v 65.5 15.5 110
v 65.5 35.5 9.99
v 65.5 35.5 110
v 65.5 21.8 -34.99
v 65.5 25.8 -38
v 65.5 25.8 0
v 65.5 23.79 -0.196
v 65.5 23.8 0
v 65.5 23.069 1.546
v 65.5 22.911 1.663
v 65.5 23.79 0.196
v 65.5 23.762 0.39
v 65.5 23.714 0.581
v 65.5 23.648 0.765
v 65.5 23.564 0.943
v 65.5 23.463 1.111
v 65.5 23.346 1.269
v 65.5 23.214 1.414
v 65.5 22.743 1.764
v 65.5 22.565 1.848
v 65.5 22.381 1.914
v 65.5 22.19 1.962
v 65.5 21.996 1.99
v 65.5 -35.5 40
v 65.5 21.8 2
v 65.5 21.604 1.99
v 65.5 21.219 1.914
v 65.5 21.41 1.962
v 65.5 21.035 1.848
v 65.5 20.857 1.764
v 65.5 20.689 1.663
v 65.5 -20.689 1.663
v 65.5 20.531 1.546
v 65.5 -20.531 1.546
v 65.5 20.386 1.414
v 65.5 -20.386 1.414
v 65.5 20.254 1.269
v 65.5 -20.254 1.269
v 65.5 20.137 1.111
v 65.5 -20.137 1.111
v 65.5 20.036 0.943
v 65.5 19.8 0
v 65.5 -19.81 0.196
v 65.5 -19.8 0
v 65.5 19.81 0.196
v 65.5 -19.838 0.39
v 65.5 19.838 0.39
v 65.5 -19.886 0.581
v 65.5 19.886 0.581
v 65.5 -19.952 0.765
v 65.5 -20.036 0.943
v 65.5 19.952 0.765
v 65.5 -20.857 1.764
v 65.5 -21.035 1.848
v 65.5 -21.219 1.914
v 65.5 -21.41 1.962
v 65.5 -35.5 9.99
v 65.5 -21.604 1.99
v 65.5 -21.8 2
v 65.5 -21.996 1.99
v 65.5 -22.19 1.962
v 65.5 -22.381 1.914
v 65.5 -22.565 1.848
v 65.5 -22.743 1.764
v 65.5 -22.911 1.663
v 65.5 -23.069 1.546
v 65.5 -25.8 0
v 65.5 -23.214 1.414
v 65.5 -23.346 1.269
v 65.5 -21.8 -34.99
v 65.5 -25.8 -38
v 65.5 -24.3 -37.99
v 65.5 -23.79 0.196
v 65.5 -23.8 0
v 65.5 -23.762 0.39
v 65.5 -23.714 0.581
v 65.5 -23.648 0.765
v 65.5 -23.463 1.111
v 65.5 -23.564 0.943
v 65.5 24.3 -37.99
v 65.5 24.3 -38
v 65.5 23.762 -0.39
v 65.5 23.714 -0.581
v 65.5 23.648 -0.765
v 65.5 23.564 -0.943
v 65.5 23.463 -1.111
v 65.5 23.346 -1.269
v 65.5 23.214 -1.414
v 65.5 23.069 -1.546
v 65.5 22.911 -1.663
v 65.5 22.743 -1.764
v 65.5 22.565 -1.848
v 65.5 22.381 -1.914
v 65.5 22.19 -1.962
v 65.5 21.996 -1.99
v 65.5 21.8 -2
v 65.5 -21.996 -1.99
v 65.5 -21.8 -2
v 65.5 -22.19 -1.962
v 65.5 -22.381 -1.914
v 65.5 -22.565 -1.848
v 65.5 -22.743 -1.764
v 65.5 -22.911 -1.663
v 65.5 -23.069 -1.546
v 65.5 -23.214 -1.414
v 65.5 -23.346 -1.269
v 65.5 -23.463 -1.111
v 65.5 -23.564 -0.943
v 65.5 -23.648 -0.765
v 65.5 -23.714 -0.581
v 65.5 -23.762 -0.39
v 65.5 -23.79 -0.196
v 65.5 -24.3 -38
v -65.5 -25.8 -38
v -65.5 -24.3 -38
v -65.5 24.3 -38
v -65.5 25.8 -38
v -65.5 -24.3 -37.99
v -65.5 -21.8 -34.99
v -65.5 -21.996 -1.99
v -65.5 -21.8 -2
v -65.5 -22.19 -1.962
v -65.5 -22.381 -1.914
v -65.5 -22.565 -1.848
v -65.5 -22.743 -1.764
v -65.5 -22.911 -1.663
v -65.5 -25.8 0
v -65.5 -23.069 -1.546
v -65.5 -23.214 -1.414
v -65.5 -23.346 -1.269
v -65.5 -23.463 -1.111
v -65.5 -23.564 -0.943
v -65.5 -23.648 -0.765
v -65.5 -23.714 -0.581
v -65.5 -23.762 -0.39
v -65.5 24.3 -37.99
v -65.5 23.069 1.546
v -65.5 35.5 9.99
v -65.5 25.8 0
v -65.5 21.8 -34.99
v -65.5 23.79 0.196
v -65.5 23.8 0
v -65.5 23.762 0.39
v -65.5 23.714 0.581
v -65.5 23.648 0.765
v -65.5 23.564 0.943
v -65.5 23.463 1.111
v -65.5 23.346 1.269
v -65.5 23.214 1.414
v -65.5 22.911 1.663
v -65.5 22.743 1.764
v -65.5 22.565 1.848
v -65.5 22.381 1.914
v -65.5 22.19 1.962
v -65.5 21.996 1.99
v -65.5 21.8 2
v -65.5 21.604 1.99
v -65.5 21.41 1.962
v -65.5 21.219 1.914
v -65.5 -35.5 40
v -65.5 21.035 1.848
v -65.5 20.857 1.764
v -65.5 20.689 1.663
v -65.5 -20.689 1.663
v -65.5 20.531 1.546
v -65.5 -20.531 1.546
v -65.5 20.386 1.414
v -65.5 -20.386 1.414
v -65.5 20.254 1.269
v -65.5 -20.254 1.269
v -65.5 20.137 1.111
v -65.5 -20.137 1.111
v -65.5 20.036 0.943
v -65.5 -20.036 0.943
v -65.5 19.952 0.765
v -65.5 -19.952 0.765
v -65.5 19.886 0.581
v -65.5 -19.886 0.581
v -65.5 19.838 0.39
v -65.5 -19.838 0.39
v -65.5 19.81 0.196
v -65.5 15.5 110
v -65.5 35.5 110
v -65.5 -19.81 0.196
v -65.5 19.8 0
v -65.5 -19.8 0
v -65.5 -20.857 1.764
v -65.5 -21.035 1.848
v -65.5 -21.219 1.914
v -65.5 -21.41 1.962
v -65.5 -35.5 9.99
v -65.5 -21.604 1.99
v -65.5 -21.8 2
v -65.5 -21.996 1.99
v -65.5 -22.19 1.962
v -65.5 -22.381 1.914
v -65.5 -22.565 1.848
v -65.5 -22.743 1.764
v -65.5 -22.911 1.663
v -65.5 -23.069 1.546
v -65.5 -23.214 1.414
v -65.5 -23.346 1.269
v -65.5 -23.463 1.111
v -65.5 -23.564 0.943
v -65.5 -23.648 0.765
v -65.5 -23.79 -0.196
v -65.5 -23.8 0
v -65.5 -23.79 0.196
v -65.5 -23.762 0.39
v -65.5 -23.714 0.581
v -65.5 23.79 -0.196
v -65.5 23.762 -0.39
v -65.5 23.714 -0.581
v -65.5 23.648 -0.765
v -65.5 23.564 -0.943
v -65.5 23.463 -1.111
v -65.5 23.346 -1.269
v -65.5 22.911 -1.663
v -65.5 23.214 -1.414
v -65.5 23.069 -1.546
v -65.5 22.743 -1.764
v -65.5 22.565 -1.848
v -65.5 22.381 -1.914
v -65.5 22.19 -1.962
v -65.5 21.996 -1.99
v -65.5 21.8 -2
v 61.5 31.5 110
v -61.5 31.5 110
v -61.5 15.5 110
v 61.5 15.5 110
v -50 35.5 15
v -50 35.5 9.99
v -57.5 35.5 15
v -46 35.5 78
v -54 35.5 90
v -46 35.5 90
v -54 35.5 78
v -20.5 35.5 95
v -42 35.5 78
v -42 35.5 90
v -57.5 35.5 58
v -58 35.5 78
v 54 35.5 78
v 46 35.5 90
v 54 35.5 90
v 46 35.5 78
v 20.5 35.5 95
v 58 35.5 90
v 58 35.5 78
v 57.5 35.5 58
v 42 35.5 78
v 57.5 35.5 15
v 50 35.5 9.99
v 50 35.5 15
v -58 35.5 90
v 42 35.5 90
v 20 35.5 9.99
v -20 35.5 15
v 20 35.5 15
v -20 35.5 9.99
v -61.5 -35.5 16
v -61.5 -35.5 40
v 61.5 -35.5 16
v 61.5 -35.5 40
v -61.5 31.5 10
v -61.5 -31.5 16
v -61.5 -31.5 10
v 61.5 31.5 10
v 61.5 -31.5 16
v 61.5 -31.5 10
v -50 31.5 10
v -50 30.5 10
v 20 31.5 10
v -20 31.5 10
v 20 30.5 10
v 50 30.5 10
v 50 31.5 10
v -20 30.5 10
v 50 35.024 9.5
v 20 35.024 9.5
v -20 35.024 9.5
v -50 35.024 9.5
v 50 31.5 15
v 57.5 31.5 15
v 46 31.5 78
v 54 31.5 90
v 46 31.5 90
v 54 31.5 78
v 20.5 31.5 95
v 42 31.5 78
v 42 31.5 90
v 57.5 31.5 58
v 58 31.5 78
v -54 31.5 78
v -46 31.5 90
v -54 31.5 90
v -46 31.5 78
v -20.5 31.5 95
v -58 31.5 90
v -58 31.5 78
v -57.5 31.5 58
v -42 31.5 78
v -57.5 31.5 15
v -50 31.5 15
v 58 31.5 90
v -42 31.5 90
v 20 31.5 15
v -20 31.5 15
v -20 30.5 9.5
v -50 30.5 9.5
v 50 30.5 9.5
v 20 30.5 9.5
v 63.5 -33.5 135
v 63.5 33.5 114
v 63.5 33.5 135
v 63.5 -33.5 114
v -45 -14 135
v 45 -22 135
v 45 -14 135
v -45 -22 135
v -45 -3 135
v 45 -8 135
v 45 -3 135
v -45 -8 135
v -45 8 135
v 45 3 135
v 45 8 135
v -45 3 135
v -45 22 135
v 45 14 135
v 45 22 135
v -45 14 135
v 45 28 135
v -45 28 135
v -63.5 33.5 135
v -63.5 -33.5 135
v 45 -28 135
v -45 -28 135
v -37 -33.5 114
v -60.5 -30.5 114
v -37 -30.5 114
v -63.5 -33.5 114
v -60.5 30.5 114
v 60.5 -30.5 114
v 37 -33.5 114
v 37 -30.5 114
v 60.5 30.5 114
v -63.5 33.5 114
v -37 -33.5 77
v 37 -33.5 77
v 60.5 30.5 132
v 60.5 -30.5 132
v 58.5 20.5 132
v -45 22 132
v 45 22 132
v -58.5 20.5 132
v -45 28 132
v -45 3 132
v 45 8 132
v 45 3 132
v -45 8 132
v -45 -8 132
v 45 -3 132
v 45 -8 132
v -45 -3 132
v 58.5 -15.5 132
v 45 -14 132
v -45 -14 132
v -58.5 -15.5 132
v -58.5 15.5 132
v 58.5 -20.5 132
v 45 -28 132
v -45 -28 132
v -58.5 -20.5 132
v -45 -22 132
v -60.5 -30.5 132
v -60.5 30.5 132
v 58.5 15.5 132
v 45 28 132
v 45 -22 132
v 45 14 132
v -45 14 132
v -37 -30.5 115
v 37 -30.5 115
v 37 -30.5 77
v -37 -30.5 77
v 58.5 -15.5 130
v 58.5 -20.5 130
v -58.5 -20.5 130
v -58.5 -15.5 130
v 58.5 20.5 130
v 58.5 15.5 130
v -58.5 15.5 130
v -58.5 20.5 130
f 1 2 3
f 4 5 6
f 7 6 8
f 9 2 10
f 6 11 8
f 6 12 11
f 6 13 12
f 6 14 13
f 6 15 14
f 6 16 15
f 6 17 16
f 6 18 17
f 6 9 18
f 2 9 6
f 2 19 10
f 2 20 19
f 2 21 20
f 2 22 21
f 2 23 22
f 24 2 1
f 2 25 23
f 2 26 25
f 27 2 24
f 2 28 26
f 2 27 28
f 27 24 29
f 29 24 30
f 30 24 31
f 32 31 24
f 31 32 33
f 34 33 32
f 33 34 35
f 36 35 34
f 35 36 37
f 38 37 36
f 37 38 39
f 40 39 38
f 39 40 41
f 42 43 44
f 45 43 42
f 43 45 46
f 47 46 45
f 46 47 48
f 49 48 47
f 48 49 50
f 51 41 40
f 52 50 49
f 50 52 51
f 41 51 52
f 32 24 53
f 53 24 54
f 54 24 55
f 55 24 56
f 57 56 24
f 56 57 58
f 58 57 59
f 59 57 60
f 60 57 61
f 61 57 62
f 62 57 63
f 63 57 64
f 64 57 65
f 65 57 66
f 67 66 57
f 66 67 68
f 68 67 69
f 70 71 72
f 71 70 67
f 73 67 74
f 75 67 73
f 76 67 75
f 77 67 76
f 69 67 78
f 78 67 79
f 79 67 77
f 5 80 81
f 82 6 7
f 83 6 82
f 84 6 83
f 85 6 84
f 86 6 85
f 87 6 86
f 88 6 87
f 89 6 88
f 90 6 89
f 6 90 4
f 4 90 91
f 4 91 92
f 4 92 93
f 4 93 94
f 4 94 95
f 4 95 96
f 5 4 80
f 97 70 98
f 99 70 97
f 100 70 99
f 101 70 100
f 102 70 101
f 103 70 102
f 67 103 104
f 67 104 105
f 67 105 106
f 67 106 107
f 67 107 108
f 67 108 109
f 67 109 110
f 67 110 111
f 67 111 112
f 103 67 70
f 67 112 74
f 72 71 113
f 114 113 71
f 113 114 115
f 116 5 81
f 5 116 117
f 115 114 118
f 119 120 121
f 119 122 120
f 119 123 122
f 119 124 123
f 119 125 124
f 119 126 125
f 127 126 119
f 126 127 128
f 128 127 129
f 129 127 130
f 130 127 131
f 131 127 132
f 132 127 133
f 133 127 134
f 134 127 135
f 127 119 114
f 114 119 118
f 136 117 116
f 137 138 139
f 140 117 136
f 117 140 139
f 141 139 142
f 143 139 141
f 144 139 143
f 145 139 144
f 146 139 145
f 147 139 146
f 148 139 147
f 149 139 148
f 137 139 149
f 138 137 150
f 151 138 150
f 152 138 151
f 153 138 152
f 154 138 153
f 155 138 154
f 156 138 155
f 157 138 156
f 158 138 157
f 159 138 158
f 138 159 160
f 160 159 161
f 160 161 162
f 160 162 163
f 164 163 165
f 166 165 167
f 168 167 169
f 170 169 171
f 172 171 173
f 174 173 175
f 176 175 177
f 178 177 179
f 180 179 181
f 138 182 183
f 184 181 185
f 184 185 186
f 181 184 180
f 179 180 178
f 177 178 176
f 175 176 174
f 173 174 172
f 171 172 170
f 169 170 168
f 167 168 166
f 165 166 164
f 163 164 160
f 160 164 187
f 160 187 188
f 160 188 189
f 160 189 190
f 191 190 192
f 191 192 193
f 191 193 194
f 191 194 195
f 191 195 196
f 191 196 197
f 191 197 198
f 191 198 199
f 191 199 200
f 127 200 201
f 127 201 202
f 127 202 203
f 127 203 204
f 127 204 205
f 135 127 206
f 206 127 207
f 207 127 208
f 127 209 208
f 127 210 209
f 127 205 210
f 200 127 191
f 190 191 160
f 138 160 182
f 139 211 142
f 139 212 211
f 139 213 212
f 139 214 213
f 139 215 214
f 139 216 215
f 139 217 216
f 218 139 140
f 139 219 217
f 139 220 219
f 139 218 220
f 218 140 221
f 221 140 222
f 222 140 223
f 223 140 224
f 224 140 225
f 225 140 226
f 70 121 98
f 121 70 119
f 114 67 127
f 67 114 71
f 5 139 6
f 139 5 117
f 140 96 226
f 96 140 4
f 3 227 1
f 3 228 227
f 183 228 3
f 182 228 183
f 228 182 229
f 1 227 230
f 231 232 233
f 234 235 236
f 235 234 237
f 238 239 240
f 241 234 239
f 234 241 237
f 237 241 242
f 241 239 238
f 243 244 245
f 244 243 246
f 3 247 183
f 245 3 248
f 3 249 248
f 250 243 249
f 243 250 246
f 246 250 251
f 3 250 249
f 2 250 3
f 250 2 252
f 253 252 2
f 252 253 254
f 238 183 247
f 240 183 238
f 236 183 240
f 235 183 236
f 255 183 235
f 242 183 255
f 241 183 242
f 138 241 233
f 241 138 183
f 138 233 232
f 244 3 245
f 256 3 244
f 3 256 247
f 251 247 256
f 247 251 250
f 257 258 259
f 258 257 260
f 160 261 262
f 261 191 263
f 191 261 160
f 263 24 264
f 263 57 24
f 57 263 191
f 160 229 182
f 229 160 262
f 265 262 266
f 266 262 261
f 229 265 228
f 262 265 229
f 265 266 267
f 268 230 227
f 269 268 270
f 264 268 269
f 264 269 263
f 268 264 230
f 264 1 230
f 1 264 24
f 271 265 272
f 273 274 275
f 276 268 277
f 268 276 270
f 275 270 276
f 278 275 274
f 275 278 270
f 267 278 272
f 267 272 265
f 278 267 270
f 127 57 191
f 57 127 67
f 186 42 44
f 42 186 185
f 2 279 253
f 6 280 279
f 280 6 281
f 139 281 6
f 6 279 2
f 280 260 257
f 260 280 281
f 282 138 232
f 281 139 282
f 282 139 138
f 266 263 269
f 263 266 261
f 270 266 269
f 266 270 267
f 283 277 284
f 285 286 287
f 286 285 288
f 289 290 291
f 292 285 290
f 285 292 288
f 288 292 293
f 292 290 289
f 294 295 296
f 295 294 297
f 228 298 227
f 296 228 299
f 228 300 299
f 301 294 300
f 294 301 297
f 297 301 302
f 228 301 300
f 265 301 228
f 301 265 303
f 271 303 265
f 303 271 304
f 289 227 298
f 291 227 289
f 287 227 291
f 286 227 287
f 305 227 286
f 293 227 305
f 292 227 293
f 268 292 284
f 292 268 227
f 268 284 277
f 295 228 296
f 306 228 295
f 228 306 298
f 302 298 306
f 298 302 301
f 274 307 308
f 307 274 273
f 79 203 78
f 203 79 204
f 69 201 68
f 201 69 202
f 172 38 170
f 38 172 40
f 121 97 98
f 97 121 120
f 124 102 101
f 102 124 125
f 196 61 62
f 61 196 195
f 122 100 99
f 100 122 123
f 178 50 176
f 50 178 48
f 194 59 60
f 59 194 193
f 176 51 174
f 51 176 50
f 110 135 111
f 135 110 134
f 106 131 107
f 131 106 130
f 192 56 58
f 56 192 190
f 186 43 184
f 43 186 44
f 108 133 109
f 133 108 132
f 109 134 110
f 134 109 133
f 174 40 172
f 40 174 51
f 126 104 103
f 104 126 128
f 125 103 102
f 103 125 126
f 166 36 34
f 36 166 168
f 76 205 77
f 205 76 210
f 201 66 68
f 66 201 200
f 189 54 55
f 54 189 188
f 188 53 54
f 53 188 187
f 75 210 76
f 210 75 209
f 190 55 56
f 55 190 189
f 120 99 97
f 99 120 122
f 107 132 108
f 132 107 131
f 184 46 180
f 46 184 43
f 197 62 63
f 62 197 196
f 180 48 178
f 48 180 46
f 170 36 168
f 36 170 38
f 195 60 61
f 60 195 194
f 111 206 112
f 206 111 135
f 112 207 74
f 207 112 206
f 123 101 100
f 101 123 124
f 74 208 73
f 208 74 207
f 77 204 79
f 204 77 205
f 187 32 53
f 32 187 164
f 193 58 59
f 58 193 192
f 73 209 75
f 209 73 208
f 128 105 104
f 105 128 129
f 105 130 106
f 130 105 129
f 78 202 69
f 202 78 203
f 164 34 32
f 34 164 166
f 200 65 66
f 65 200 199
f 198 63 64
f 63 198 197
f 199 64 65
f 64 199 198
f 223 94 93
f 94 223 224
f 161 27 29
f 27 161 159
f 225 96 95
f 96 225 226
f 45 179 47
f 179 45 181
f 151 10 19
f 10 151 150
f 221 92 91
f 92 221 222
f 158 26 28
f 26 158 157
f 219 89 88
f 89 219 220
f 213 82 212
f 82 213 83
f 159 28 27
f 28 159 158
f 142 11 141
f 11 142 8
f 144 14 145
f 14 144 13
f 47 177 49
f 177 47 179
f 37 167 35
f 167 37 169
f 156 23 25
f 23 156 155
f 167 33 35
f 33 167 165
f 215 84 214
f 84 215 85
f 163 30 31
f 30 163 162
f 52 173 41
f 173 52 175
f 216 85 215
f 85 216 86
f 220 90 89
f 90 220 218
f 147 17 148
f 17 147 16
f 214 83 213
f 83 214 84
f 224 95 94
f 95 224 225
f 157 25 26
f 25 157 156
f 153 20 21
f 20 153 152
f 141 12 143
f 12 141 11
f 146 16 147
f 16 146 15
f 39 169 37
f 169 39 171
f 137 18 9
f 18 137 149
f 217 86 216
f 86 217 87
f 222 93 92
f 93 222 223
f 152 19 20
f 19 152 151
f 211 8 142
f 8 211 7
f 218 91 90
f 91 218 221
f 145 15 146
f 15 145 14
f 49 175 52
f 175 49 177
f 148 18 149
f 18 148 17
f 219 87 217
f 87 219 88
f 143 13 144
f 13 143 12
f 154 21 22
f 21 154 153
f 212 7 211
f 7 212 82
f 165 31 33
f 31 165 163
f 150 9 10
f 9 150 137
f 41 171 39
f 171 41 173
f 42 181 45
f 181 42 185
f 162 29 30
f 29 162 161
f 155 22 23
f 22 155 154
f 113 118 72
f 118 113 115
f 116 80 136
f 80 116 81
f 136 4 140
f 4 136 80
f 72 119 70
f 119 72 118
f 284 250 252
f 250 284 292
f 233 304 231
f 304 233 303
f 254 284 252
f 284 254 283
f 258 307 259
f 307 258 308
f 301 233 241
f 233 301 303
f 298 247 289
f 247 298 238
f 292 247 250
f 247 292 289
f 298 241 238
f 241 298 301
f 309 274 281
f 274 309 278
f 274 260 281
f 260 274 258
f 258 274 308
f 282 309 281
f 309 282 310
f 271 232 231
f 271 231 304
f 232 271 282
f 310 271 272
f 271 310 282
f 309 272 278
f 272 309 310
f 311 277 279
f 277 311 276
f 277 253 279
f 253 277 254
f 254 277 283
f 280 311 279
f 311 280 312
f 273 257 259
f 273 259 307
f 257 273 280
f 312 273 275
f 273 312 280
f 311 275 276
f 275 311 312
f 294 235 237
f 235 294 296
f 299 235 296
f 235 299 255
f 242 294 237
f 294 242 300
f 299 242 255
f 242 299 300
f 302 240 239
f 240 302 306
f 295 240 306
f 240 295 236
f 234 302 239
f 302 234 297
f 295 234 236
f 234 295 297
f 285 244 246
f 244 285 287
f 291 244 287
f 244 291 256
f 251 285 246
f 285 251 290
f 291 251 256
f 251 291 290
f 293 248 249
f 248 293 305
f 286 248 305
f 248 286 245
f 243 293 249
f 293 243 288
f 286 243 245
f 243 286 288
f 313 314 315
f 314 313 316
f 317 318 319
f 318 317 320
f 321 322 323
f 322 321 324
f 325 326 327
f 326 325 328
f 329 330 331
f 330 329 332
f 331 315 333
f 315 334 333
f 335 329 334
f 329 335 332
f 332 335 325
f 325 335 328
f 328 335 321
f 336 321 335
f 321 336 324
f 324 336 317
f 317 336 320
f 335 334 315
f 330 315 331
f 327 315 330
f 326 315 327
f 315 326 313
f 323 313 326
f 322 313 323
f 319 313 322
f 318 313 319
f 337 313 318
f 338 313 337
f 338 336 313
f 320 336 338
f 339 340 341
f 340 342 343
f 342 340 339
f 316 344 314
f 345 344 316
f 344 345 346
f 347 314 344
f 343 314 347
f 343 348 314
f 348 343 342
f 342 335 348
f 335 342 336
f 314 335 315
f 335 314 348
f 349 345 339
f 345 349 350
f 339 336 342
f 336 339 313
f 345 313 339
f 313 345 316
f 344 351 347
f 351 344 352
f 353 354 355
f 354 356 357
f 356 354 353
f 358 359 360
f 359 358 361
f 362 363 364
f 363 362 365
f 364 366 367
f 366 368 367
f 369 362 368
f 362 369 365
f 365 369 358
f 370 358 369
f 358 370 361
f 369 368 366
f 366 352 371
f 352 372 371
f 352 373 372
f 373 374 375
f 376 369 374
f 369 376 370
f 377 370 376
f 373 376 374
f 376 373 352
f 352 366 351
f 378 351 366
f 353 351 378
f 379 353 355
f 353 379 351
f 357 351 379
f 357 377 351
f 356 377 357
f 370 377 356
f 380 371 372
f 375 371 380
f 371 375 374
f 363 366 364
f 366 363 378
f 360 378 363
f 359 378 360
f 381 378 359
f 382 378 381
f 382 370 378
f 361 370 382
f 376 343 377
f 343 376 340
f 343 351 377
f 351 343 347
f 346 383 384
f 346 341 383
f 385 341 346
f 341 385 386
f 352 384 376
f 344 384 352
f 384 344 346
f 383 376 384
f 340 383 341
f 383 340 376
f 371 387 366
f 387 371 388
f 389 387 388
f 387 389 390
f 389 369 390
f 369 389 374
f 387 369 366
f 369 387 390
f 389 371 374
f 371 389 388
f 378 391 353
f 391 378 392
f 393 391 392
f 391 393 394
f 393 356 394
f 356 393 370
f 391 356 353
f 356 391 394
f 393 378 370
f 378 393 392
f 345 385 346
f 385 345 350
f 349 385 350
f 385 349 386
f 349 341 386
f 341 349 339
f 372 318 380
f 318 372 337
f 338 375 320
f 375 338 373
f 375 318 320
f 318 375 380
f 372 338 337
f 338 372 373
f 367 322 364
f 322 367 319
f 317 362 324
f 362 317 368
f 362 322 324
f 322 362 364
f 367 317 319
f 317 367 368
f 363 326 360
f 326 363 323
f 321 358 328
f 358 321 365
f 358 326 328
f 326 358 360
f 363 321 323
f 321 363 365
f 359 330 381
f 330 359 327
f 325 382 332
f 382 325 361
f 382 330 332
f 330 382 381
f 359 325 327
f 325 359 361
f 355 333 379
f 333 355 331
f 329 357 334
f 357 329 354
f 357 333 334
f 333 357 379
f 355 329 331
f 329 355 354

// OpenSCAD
// file: sac5a_display_hood.scad
// =============================================================================
//  定刻起床装置 個人簡易型 SAC-5A型  制御タイマー(型式 SUK-49) 用
//  液晶めかくしフード（上からかぶせる蓋）
// -----------------------------------------------------------------------------
//  ・本体の上端に上からスポッとかぶせるキャップ
//  ・前に垂れる「バイザー」が液晶だけを覆う
//  ・アラームボタンも停止A/Bも操作ボタンも、全部バイザーの外に出る
//  ・外すときは真上に持ち上げるだけ
//
//  寸法根拠 : 取扱説明書「制御タイマー 各部名称」図を 800 dpi で描画して実測
//             （120 × 120 の盤面に対し、左端／底面からの mm）
//
//    液晶ディスプレイ  … 左 25.8〜94.4 / 底 69.3〜104.2
//    LED表示(電源/アラーム/停電/エラー) … 左 28.4〜63.7 / 底 56.4〜64.6
//    アラームボタン    … 左 73.1〜93.6 / 底 39.8〜49.2
//    停止ボタンA       … 左  2.6〜19.7 / 底 79〜94
//    停止ボタンB       … 左 99.5〜116.1 / 底 79〜94
//
//  → 液晶は盤面のほぼ中央(中心から ±34.4)、停止ボタンはその外側(±40.3 より外)。
//    バイザーを半幅 37 にすると、液晶を完全に覆ったまま停止A/Bが両方露出する。
//  → バイザー下端を底から 67 にすると、液晶(69.3)は覆い、
//    LED表示(64.6)とアラームボタン(49.2)は見える/押せる。
//
//  座標系 : z = 0 が制御タイマーの上面 / x,y は本体の中心
//           -Y = 表示・ボタン側 / +Y = 背面側
//  単位   : mm
// =============================================================================

$fn = 48;

// --------------------------------------------------- 制御タイマー(SUK-49)
DEV_W = 120;   // 幅   (X)
DEV_D = 60;    // 奥行 (Y)
DEV_H = 120;   // 高さ (Z)

// ------------------------------------------------------------------ はめあい
FIT   = 0.5;   // 片側クリアランス。きつくて入らない→0.7 / ゆるい→0.35

// -------------------------------------------------------------------- 肉厚等
WALL    = 3;   // 側面・背面・バイザーの厚さ
TOP_T   = 3;   // 天板厚
SKIRT_H = 16;  // 本体上端から下へ何mmかぶせるか（この範囲は全周を囲む）

// ------------------------------------------------------------------ バイザー
VISOR_HW     = 37;  // 半幅。液晶(±34.4)を覆い、停止A/B(±40.3〜)を避ける
VISOR_BOTTOM = 67;  // 下端（本体底面からの高さ）
                    //   67 … 液晶だけ覆う。LED表示とアラームボタンは見える(既定)
                    //   53 … LED表示も覆う。アラームボタンはまだ押せる

// -------------------------------------------------------------------- 通気
VENT    = true; // 天板のスリット（通気 + 指がかり）
RIB_H   = 2;    // 天板を本体上面から浮かせるリブの高さ

PLACE_ON_BED = true; // true: 天板を下にして Z=0 に配置（造形向き）

// =============================================================================
//  派生寸法（z = 0 が本体の上面）
// =============================================================================
iw = DEV_W / 2 + FIT;   // 内側 半幅
ow = iw + WALL;         // 外側 半幅
id = DEV_D / 2 + FIT;   // 内側 半奥行
od = id + WALL;         // 外側 半奥行

plate_z0 = RIB_H;            // 天板 下面
plate_z1 = RIB_H + TOP_T;    // 天板 上面
visor_z  = VISOR_BOTTOM - DEV_H;  // バイザー下端（本体上面基準なので負）

module bx(x0, x1, y0, y1, z0, z1)
    translate([min(x0, x1), min(y0, y1), min(z0, z1)])
        cube([abs(x1 - x0), abs(y1 - y0), abs(z1 - z0)]);

// =============================================================================
//  1. キャップ : 本体の上端 SKIRT_H mm を全周囲む箱（下面は開放）
// =============================================================================
module cap() {
    difference() {
        bx(-ow, ow, -od, od, -SKIRT_H, plate_z1);
        bx(-iw, iw, -id, id, -SKIRT_H - 1, plate_z0);
    }
}

// 天板を浮かせるリブ（本体上面に当たる）
module ribs() {
    for (sy = [-1, 1])
        bx(-iw + 2, iw - 2, sy * 18 - 2.5, sy * 18 + 2.5, 0, plate_z0 + 0.5);
}

// =============================================================================
//  2. バイザー : 前面から下へ垂れて液晶だけを覆う
// =============================================================================
module visor() {
    bx(-VISOR_HW, VISOR_HW, -od, -id, visor_z, -SKIRT_H + 1);
}

// =============================================================================
//  3. 天板のスリット（通気と指がかり）
// =============================================================================
module vents() {
    if (VENT)
        for (yc = [-25, -11, 0, 11, 25])   // リブ(±18)に掛からない位置
            bx(-45, 45, yc - 3, yc + 3, plate_z0 - 1, plate_z1 + 1);
}

// =============================================================================
//  組み立て
// =============================================================================
module hood() {
    difference() {
        union() {
            cap();
            ribs();
            visor();
        }
        vents();
    }
}

// 参考表示 : 制御タイマー本体（STL には含まれない）
module device_ghost() {
    %translate([-DEV_W / 2, -DEV_D / 2, -DEV_H])
        cube([DEV_W, DEV_D, DEV_H]);
}

if (PLACE_ON_BED)
    translate([0, 0, plate_z1]) rotate([180, 0, 0]) hood();
else
    hood();
// file: sac5a_controller_mount.scad
// =============================================================================
//  定刻起床装置 個人簡易型 SAC-5A型  制御タイマー(型式 SUK-49) 用
//  ベッドフレーム(43 x 43 角パイプ)上置きホルダー
// -----------------------------------------------------------------------------
//  構造
//    ・角パイプに上からかぶせる ∩ 形の脚（ねじ・金具なし）
//    ・その真上のベースプレートにポケットを載せる
//    ・制御タイマーは上から落とし込んで差し込む
//
//  「フレームより上」に置く利点
//    ・本体背面が完全に空中に出るので、送風機プラグ・電源ケーブル・電池カバーの
//      逃がしを考えなくてよい（角パイプが後ろに来ない）
//    ・荷重が角パイプの真上に載るので片持ちにならず、曲げがほぼ発生しない
//
//  寸法根拠 (新光電業(株) SAC-5A型 取扱説明書「主な製品仕様」)
//    制御タイマー(SUK-49)  高さ 120 × 幅 120 × 奥行 60 (mm) / 500 (g)
//
//  ---------------------------------------------------------------------------
//  取扱説明書の「各部名称」図を実測して得た、盤面上の要素配置
//  （120 × 120 の盤面に対し、左端／底面からの mm。図面からの読み取り値）
//
//    ≪背面≫  送風機プラグ差込口 … 左 14〜35  / 底 24〜40
//             電源ケーブル差込口 … 左 14〜35  / 底 14〜22
//             電池カバー         … 左 47〜113 / 底  9〜42
//             ツマミ             … 左 約 80   / 底 42〜48
//      → 底から約 48 mm より上は完全な平面。背面パネルはここから上に張る。
//      → 差込口が左右どちら側に来るかは設置の向き次第なので、開口は左右対称。
//
//    ≪正面≫  最下段の[戻る]ボタン下端 … 底から 8 mm
//      → 表示側リップは 6 mm までに抑える。
//  ---------------------------------------------------------------------------
//
//  向き
//    -Y 側 … 表示・操作ボタン面（寝ている人の側を向く）→ リップを低く
//    +Y 側 … 背面（送風機プラグ / 電源ケーブル / 電池カバー）→ ケーブルは外へ抜ける
//    逆向きにしたいときは FLIP_Y = true
//
//  座標系 : Z=0 レール上面 / Y=0 レール断面中心 / X = レール長手方向
//  単位   : mm
// =============================================================================

$fn = 64;

// --------------------------------------------------- 制御タイマー(SUK-49)
DEV_W   = 120;   // 幅   (X)
DEV_H   = 120;   // 高さ (Z) ※参考値。ポケットは全高を覆わない
DEV_D   = 60;    // 奥行 (Y)
DEV_CLR = 1.5;   // 片側クリアランス(角R・印刷誤差ぶん)

// ------------------------------------------------------- ベッドフレーム
RAIL_W   = 43;   // 角パイプ 幅   (Y)
RAIL_H   = 43;   // 角パイプ 高さ (Z) ※掛かりは LEG_DROP で決まる
RAIL_CLR = 0.6;  // はめあいクリアランス(全幅)。きつい→0.8 / ゆるい→0.4

// --------------------------------------------------------------- 肉厚等
WALL     = 4;    // 一般肉厚(側壁・リップ・脚)
PLATE_T  = 10;   // ベースプレート厚(サドル天板 兼 ポケット床)
LEG_DROP = 38;   // 脚の掛かり深さ(RAIL_H=43 に対して)

// ------------------------------------------------------------- ポケット
POCKET_Y     = 0;   // レール中心からのYオフセット(+で外側へずらす)
SIDE_H_CABLE = 100; // 側壁高さ : ケーブル側(+Y)。背面パネルと同じ高さ
SIDE_H_FACE  = 30;  // 側壁高さ : 表示側(-Y)
LIP_FACE_H   = 6;   // 表示側リップ。[戻る]ボタン下端(底から8mm)より低くする

// ------------------------------------------------------------- 背面パネル
//   左右の側壁を上端で繋いで箱剛性を出し、本体の背面を受け止める。
//   下側は大きく開けて、差込口・電池カバー・ケーブルの通り道にする。
BACK_LIP_H    = 5;    // 開口の下端 = 底のリップ高さ。電池カバー下端(9mm)より低く
BACK_OPEN_HW  = 57.5; // 開口の半幅。電池カバー端(中心から53mm)を逃がす
BACK_OPEN_TOP = 48;   // 開口の垂直部の上端。ツマミ上端(48mm)まで開ける
BACK_CHAMF    = 37;   // ここから45度で絞る高さ。天井は 115-2*37 = 41mm のブリッジ
TIE_SLOTS     = true; // 結束バンド用スリット(ケーブルを背面パネルに留める)

// ----------------------------------------------------------- クランプねじ
//   既定では「かぶせるだけ」のシンプルな形。停止ボタンを押したときのガタつきが
//   気になる場合だけ CLAMP_SCREWS = true にすると、脚にねじボスが生える。
CLAMP_SCREWS = false; // M4x25 を2本、表示側の脚から締めてガタ止め
SCREW_D      = 3.4;   // M4 タッピング下穴
BOSS_D       = 11;    // ねじボス外径
BOSS_L       = 6;     // ねじボス突出量(45度テーパでサポートレス)
SCREW_X      = 30;    // ねじ位置(中心からの距離)
SCREW_Z      = -20;   // ねじ高さ

// ------------------------------------------------------------- オプション
CABLE_NOTCH  = true;  // 底のリップの切り欠き(ケーブルをプレート面へ落とす)
FLIP_Y       = false; // true で表示面の向きを反転
PLACE_ON_BED = true;  // true: 底面が Z=0 に来るよう移動(スライサ用)

// =============================================================================
//  派生寸法
// =============================================================================
cav_w     = RAIL_W + RAIL_CLR;   // レールが通る空間の幅
cav_y     = cav_w / 2;           // その内壁 Y
out_y     = cav_y + WALL;        // 脚の外面 Y

pocket_w  = DEV_W + 2 * DEV_CLR;
pocket_d  = DEV_D + 2 * DEV_CLR;
px        = pocket_w / 2;        // ポケット内壁 X
cx        = px + WALL;           // 外壁 X

dy0       = POCKET_Y - pocket_d / 2;  // 表示側(-Y) 内壁
dy1       = POCKET_Y + pocket_d / 2;  // ケーブル側(+Y) 内壁
py0       = dy0 - WALL;               // 表示側 外面
py1       = dy1 + WALL;               // ケーブル側 外面

plate_top = PLATE_T;             // 本体が載る面(レール上面から +10 mm)

// 対角2点から直方体をつくる汎用モジュール
module bx(x0, x1, y0, y1, z0, z1)
    translate([min(x0, x1), min(y0, y1), min(z0, z1)])
        cube([abs(x1 - x0), abs(y1 - y0), abs(z1 - z0)]);

// =============================================================================
//  1. 脚 : 角パイプに上からかぶせる ∩ 形
// =============================================================================
module legs() {
    for (sy = [-1, 1])
        bx(-cx, cx, sy * cav_y, sy * out_y, -LEG_DROP, 1);
    if (CLAMP_SCREWS)
        for (sx = [-1, 1])
            translate([sx * SCREW_X, -out_y, SCREW_Z])
                rotate([90, 0, 0])
                    cylinder(d1 = BOSS_D + 2 * BOSS_L, d2 = BOSS_D, h = BOSS_L);
}

// レールが入る空間(下方向に開口)+ 差し込みリード面取り + 天面内隅の逃がし
module rail_cavity() {
    len = 2 * cx + 20;
    bx(-len / 2, len / 2, -cav_y, cav_y, -(LEG_DROP + 40), 0);
    // 脚の下端 3 mm を広げて、かぶせやすくする(内側へ約40度で立ち上がるので自立)
    hull() {
        bx(-len / 2, len / 2, -cav_y, cav_y, -LEG_DROP + 3, -LEG_DROP + 3.01);
        bx(-len / 2, len / 2, -(cav_y + 2.5), cav_y + 2.5, -LEG_DROP, -LEG_DROP + 0.01);
    }
    // 天面内隅の逃がし(積層のダレとパイプ角Rを吸収)
    for (sy = [-1, 1])
        translate([-len / 2, sy * cav_y, 0])
            rotate([0, 90, 0])
                cylinder(d = 4, h = len);
}

module clamp_holes() {
    if (CLAMP_SCREWS)
        for (sx = [-1, 1])
            translate([sx * SCREW_X, cav_y - 0.01, SCREW_Z])
                rotate([90, 0, 0])
                    cylinder(d = SCREW_D, h = cav_y + out_y + BOSS_L + 2);
}

// =============================================================================
//  2. ベースプレート : 脚の外寸からポケットの外寸へ 45 度未満で広がる
//     （サポートなしで造形できる角度。サドル天板とポケット床を兼ねる）
// =============================================================================
module base_plate() {
    hull() {
        bx(-cx, cx, -out_y, out_y, 0, 0.01);
        bx(-cx, cx, py0, py1, PLATE_T - 0.01, PLATE_T);
    }
}

// =============================================================================
//  3. ポケット : テーパ側壁 + 前後リップ（正面も背面も開放のまま）
// =============================================================================
module side_walls() {
    for (sx = [-1, 1])
        hull() {
            bx(sx * px, sx * cx, py0, py0 + 20,
               plate_top - 0.01, plate_top + SIDE_H_FACE);
            bx(sx * px, sx * cx, py1 - 20, py1,
               plate_top - 0.01, plate_top + SIDE_H_CABLE);
        }
}

// 表示側のリップ(操作ボタンを塞がない低さ)
module face_lip() {
    bx(-cx, cx, py0, dy0, plate_top - 0.01, plate_top + LIP_FACE_H);
}

// =============================================================================
//  4. 背面パネル : 左右の側壁を繋いで箱剛性を出す
//     下側の大開口が、そのまま差込口・電池カバー・ケーブルの通り道になる
// =============================================================================
module back_panel() {
    bx(-cx, cx, dy1, py1, plate_top - 0.01, plate_top + SIDE_H_CABLE);
}

// 背面の大開口。上端は45度で絞ってサポートレスにする
module back_opening() {
    hw  = BACK_OPEN_HW;
    hw2 = hw - BACK_CHAMF;
    bx(-hw, hw, dy1 - 1, py1 + 1,
       plate_top + BACK_LIP_H, plate_top + BACK_OPEN_TOP);
    hull() {
        bx(-hw, hw, dy1 - 1, py1 + 1,
           plate_top + BACK_OPEN_TOP - 0.01, plate_top + BACK_OPEN_TOP);
        bx(-hw2, hw2, dy1 - 1, py1 + 1,
           plate_top + BACK_OPEN_TOP + BACK_CHAMF - 0.01,
           plate_top + BACK_OPEN_TOP + BACK_CHAMF);
    }
}

// 底のリップの切り欠き : ケーブルをプレート面まで落として外へ逃がす(左右対称)
module cable_cut() {
    if (CABLE_NOTCH)
        for (sx = [-1, 1])
            bx(sx * 20, sx * 50, dy1 - 1, py1 + 1,
               plate_top - 0.5, plate_top + BACK_LIP_H);
}

// 結束バンド用スリット : 45度で絞った肉の残る部分に開ける
module tie_slots() {
    if (TIE_SLOTS)
        for (sx = [-1, 1])
            for (d = [-6, 6])
                bx(sx * 50 + d - 2, sx * 50 + d + 2, dy1 - 1, py1 + 1,
                   plate_top + 68, plate_top + 80);
}

// =============================================================================
//  組み立て
// =============================================================================
module holder() {
    mirror([0, FLIP_Y ? 1 : 0, 0])
        difference() {
            union() {
                legs();
                base_plate();
                side_walls();
                face_lip();
                back_panel();
            }
            rail_cavity();
            clamp_holes();
            back_opening();
            cable_cut();
            tie_slots();
        }
}

// 参考表示 : 制御タイマー本体(STL には含まれない)
module device_ghost() {
    mirror([0, FLIP_Y ? 1 : 0, 0])
        %translate([-DEV_W / 2, dy0 + DEV_CLR, plate_top])
            cube([DEV_W, DEV_D, DEV_H]);
}

// 参考表示 : ベッドフレーム角パイプ
module rail_ghost() {
    %translate([-150, -RAIL_W / 2, -RAIL_H])
        cube([300, RAIL_W, RAIL_H]);
}

if (PLACE_ON_BED)
    translate([0, 0, LEG_DROP]) holder();
else
    holder();
// main file
// ホルダー + 制御タイマー + 液晶フード の合わせ確認用
use <sac5a_controller_mount.scad>
use <sac5a_display_hood.scad>

DEV_W = 120; DEV_D = 60; DEV_H = 120;
PLATE_TOP = 10;    // 本体が載る面（ホルダー側の plate_top）
RAIL = 43;

holder();
%translate([-DEV_W/2, -DEV_D/2, PLATE_TOP]) cube([DEV_W, DEV_D, DEV_H]);   // 制御タイマー
%translate([-150, -RAIL/2, -RAIL]) cube([300, RAIL, RAIL]);                // 角パイプ
color("SteelBlue") translate([0, 0, PLATE_TOP + DEV_H]) hood();            // 液晶フード
